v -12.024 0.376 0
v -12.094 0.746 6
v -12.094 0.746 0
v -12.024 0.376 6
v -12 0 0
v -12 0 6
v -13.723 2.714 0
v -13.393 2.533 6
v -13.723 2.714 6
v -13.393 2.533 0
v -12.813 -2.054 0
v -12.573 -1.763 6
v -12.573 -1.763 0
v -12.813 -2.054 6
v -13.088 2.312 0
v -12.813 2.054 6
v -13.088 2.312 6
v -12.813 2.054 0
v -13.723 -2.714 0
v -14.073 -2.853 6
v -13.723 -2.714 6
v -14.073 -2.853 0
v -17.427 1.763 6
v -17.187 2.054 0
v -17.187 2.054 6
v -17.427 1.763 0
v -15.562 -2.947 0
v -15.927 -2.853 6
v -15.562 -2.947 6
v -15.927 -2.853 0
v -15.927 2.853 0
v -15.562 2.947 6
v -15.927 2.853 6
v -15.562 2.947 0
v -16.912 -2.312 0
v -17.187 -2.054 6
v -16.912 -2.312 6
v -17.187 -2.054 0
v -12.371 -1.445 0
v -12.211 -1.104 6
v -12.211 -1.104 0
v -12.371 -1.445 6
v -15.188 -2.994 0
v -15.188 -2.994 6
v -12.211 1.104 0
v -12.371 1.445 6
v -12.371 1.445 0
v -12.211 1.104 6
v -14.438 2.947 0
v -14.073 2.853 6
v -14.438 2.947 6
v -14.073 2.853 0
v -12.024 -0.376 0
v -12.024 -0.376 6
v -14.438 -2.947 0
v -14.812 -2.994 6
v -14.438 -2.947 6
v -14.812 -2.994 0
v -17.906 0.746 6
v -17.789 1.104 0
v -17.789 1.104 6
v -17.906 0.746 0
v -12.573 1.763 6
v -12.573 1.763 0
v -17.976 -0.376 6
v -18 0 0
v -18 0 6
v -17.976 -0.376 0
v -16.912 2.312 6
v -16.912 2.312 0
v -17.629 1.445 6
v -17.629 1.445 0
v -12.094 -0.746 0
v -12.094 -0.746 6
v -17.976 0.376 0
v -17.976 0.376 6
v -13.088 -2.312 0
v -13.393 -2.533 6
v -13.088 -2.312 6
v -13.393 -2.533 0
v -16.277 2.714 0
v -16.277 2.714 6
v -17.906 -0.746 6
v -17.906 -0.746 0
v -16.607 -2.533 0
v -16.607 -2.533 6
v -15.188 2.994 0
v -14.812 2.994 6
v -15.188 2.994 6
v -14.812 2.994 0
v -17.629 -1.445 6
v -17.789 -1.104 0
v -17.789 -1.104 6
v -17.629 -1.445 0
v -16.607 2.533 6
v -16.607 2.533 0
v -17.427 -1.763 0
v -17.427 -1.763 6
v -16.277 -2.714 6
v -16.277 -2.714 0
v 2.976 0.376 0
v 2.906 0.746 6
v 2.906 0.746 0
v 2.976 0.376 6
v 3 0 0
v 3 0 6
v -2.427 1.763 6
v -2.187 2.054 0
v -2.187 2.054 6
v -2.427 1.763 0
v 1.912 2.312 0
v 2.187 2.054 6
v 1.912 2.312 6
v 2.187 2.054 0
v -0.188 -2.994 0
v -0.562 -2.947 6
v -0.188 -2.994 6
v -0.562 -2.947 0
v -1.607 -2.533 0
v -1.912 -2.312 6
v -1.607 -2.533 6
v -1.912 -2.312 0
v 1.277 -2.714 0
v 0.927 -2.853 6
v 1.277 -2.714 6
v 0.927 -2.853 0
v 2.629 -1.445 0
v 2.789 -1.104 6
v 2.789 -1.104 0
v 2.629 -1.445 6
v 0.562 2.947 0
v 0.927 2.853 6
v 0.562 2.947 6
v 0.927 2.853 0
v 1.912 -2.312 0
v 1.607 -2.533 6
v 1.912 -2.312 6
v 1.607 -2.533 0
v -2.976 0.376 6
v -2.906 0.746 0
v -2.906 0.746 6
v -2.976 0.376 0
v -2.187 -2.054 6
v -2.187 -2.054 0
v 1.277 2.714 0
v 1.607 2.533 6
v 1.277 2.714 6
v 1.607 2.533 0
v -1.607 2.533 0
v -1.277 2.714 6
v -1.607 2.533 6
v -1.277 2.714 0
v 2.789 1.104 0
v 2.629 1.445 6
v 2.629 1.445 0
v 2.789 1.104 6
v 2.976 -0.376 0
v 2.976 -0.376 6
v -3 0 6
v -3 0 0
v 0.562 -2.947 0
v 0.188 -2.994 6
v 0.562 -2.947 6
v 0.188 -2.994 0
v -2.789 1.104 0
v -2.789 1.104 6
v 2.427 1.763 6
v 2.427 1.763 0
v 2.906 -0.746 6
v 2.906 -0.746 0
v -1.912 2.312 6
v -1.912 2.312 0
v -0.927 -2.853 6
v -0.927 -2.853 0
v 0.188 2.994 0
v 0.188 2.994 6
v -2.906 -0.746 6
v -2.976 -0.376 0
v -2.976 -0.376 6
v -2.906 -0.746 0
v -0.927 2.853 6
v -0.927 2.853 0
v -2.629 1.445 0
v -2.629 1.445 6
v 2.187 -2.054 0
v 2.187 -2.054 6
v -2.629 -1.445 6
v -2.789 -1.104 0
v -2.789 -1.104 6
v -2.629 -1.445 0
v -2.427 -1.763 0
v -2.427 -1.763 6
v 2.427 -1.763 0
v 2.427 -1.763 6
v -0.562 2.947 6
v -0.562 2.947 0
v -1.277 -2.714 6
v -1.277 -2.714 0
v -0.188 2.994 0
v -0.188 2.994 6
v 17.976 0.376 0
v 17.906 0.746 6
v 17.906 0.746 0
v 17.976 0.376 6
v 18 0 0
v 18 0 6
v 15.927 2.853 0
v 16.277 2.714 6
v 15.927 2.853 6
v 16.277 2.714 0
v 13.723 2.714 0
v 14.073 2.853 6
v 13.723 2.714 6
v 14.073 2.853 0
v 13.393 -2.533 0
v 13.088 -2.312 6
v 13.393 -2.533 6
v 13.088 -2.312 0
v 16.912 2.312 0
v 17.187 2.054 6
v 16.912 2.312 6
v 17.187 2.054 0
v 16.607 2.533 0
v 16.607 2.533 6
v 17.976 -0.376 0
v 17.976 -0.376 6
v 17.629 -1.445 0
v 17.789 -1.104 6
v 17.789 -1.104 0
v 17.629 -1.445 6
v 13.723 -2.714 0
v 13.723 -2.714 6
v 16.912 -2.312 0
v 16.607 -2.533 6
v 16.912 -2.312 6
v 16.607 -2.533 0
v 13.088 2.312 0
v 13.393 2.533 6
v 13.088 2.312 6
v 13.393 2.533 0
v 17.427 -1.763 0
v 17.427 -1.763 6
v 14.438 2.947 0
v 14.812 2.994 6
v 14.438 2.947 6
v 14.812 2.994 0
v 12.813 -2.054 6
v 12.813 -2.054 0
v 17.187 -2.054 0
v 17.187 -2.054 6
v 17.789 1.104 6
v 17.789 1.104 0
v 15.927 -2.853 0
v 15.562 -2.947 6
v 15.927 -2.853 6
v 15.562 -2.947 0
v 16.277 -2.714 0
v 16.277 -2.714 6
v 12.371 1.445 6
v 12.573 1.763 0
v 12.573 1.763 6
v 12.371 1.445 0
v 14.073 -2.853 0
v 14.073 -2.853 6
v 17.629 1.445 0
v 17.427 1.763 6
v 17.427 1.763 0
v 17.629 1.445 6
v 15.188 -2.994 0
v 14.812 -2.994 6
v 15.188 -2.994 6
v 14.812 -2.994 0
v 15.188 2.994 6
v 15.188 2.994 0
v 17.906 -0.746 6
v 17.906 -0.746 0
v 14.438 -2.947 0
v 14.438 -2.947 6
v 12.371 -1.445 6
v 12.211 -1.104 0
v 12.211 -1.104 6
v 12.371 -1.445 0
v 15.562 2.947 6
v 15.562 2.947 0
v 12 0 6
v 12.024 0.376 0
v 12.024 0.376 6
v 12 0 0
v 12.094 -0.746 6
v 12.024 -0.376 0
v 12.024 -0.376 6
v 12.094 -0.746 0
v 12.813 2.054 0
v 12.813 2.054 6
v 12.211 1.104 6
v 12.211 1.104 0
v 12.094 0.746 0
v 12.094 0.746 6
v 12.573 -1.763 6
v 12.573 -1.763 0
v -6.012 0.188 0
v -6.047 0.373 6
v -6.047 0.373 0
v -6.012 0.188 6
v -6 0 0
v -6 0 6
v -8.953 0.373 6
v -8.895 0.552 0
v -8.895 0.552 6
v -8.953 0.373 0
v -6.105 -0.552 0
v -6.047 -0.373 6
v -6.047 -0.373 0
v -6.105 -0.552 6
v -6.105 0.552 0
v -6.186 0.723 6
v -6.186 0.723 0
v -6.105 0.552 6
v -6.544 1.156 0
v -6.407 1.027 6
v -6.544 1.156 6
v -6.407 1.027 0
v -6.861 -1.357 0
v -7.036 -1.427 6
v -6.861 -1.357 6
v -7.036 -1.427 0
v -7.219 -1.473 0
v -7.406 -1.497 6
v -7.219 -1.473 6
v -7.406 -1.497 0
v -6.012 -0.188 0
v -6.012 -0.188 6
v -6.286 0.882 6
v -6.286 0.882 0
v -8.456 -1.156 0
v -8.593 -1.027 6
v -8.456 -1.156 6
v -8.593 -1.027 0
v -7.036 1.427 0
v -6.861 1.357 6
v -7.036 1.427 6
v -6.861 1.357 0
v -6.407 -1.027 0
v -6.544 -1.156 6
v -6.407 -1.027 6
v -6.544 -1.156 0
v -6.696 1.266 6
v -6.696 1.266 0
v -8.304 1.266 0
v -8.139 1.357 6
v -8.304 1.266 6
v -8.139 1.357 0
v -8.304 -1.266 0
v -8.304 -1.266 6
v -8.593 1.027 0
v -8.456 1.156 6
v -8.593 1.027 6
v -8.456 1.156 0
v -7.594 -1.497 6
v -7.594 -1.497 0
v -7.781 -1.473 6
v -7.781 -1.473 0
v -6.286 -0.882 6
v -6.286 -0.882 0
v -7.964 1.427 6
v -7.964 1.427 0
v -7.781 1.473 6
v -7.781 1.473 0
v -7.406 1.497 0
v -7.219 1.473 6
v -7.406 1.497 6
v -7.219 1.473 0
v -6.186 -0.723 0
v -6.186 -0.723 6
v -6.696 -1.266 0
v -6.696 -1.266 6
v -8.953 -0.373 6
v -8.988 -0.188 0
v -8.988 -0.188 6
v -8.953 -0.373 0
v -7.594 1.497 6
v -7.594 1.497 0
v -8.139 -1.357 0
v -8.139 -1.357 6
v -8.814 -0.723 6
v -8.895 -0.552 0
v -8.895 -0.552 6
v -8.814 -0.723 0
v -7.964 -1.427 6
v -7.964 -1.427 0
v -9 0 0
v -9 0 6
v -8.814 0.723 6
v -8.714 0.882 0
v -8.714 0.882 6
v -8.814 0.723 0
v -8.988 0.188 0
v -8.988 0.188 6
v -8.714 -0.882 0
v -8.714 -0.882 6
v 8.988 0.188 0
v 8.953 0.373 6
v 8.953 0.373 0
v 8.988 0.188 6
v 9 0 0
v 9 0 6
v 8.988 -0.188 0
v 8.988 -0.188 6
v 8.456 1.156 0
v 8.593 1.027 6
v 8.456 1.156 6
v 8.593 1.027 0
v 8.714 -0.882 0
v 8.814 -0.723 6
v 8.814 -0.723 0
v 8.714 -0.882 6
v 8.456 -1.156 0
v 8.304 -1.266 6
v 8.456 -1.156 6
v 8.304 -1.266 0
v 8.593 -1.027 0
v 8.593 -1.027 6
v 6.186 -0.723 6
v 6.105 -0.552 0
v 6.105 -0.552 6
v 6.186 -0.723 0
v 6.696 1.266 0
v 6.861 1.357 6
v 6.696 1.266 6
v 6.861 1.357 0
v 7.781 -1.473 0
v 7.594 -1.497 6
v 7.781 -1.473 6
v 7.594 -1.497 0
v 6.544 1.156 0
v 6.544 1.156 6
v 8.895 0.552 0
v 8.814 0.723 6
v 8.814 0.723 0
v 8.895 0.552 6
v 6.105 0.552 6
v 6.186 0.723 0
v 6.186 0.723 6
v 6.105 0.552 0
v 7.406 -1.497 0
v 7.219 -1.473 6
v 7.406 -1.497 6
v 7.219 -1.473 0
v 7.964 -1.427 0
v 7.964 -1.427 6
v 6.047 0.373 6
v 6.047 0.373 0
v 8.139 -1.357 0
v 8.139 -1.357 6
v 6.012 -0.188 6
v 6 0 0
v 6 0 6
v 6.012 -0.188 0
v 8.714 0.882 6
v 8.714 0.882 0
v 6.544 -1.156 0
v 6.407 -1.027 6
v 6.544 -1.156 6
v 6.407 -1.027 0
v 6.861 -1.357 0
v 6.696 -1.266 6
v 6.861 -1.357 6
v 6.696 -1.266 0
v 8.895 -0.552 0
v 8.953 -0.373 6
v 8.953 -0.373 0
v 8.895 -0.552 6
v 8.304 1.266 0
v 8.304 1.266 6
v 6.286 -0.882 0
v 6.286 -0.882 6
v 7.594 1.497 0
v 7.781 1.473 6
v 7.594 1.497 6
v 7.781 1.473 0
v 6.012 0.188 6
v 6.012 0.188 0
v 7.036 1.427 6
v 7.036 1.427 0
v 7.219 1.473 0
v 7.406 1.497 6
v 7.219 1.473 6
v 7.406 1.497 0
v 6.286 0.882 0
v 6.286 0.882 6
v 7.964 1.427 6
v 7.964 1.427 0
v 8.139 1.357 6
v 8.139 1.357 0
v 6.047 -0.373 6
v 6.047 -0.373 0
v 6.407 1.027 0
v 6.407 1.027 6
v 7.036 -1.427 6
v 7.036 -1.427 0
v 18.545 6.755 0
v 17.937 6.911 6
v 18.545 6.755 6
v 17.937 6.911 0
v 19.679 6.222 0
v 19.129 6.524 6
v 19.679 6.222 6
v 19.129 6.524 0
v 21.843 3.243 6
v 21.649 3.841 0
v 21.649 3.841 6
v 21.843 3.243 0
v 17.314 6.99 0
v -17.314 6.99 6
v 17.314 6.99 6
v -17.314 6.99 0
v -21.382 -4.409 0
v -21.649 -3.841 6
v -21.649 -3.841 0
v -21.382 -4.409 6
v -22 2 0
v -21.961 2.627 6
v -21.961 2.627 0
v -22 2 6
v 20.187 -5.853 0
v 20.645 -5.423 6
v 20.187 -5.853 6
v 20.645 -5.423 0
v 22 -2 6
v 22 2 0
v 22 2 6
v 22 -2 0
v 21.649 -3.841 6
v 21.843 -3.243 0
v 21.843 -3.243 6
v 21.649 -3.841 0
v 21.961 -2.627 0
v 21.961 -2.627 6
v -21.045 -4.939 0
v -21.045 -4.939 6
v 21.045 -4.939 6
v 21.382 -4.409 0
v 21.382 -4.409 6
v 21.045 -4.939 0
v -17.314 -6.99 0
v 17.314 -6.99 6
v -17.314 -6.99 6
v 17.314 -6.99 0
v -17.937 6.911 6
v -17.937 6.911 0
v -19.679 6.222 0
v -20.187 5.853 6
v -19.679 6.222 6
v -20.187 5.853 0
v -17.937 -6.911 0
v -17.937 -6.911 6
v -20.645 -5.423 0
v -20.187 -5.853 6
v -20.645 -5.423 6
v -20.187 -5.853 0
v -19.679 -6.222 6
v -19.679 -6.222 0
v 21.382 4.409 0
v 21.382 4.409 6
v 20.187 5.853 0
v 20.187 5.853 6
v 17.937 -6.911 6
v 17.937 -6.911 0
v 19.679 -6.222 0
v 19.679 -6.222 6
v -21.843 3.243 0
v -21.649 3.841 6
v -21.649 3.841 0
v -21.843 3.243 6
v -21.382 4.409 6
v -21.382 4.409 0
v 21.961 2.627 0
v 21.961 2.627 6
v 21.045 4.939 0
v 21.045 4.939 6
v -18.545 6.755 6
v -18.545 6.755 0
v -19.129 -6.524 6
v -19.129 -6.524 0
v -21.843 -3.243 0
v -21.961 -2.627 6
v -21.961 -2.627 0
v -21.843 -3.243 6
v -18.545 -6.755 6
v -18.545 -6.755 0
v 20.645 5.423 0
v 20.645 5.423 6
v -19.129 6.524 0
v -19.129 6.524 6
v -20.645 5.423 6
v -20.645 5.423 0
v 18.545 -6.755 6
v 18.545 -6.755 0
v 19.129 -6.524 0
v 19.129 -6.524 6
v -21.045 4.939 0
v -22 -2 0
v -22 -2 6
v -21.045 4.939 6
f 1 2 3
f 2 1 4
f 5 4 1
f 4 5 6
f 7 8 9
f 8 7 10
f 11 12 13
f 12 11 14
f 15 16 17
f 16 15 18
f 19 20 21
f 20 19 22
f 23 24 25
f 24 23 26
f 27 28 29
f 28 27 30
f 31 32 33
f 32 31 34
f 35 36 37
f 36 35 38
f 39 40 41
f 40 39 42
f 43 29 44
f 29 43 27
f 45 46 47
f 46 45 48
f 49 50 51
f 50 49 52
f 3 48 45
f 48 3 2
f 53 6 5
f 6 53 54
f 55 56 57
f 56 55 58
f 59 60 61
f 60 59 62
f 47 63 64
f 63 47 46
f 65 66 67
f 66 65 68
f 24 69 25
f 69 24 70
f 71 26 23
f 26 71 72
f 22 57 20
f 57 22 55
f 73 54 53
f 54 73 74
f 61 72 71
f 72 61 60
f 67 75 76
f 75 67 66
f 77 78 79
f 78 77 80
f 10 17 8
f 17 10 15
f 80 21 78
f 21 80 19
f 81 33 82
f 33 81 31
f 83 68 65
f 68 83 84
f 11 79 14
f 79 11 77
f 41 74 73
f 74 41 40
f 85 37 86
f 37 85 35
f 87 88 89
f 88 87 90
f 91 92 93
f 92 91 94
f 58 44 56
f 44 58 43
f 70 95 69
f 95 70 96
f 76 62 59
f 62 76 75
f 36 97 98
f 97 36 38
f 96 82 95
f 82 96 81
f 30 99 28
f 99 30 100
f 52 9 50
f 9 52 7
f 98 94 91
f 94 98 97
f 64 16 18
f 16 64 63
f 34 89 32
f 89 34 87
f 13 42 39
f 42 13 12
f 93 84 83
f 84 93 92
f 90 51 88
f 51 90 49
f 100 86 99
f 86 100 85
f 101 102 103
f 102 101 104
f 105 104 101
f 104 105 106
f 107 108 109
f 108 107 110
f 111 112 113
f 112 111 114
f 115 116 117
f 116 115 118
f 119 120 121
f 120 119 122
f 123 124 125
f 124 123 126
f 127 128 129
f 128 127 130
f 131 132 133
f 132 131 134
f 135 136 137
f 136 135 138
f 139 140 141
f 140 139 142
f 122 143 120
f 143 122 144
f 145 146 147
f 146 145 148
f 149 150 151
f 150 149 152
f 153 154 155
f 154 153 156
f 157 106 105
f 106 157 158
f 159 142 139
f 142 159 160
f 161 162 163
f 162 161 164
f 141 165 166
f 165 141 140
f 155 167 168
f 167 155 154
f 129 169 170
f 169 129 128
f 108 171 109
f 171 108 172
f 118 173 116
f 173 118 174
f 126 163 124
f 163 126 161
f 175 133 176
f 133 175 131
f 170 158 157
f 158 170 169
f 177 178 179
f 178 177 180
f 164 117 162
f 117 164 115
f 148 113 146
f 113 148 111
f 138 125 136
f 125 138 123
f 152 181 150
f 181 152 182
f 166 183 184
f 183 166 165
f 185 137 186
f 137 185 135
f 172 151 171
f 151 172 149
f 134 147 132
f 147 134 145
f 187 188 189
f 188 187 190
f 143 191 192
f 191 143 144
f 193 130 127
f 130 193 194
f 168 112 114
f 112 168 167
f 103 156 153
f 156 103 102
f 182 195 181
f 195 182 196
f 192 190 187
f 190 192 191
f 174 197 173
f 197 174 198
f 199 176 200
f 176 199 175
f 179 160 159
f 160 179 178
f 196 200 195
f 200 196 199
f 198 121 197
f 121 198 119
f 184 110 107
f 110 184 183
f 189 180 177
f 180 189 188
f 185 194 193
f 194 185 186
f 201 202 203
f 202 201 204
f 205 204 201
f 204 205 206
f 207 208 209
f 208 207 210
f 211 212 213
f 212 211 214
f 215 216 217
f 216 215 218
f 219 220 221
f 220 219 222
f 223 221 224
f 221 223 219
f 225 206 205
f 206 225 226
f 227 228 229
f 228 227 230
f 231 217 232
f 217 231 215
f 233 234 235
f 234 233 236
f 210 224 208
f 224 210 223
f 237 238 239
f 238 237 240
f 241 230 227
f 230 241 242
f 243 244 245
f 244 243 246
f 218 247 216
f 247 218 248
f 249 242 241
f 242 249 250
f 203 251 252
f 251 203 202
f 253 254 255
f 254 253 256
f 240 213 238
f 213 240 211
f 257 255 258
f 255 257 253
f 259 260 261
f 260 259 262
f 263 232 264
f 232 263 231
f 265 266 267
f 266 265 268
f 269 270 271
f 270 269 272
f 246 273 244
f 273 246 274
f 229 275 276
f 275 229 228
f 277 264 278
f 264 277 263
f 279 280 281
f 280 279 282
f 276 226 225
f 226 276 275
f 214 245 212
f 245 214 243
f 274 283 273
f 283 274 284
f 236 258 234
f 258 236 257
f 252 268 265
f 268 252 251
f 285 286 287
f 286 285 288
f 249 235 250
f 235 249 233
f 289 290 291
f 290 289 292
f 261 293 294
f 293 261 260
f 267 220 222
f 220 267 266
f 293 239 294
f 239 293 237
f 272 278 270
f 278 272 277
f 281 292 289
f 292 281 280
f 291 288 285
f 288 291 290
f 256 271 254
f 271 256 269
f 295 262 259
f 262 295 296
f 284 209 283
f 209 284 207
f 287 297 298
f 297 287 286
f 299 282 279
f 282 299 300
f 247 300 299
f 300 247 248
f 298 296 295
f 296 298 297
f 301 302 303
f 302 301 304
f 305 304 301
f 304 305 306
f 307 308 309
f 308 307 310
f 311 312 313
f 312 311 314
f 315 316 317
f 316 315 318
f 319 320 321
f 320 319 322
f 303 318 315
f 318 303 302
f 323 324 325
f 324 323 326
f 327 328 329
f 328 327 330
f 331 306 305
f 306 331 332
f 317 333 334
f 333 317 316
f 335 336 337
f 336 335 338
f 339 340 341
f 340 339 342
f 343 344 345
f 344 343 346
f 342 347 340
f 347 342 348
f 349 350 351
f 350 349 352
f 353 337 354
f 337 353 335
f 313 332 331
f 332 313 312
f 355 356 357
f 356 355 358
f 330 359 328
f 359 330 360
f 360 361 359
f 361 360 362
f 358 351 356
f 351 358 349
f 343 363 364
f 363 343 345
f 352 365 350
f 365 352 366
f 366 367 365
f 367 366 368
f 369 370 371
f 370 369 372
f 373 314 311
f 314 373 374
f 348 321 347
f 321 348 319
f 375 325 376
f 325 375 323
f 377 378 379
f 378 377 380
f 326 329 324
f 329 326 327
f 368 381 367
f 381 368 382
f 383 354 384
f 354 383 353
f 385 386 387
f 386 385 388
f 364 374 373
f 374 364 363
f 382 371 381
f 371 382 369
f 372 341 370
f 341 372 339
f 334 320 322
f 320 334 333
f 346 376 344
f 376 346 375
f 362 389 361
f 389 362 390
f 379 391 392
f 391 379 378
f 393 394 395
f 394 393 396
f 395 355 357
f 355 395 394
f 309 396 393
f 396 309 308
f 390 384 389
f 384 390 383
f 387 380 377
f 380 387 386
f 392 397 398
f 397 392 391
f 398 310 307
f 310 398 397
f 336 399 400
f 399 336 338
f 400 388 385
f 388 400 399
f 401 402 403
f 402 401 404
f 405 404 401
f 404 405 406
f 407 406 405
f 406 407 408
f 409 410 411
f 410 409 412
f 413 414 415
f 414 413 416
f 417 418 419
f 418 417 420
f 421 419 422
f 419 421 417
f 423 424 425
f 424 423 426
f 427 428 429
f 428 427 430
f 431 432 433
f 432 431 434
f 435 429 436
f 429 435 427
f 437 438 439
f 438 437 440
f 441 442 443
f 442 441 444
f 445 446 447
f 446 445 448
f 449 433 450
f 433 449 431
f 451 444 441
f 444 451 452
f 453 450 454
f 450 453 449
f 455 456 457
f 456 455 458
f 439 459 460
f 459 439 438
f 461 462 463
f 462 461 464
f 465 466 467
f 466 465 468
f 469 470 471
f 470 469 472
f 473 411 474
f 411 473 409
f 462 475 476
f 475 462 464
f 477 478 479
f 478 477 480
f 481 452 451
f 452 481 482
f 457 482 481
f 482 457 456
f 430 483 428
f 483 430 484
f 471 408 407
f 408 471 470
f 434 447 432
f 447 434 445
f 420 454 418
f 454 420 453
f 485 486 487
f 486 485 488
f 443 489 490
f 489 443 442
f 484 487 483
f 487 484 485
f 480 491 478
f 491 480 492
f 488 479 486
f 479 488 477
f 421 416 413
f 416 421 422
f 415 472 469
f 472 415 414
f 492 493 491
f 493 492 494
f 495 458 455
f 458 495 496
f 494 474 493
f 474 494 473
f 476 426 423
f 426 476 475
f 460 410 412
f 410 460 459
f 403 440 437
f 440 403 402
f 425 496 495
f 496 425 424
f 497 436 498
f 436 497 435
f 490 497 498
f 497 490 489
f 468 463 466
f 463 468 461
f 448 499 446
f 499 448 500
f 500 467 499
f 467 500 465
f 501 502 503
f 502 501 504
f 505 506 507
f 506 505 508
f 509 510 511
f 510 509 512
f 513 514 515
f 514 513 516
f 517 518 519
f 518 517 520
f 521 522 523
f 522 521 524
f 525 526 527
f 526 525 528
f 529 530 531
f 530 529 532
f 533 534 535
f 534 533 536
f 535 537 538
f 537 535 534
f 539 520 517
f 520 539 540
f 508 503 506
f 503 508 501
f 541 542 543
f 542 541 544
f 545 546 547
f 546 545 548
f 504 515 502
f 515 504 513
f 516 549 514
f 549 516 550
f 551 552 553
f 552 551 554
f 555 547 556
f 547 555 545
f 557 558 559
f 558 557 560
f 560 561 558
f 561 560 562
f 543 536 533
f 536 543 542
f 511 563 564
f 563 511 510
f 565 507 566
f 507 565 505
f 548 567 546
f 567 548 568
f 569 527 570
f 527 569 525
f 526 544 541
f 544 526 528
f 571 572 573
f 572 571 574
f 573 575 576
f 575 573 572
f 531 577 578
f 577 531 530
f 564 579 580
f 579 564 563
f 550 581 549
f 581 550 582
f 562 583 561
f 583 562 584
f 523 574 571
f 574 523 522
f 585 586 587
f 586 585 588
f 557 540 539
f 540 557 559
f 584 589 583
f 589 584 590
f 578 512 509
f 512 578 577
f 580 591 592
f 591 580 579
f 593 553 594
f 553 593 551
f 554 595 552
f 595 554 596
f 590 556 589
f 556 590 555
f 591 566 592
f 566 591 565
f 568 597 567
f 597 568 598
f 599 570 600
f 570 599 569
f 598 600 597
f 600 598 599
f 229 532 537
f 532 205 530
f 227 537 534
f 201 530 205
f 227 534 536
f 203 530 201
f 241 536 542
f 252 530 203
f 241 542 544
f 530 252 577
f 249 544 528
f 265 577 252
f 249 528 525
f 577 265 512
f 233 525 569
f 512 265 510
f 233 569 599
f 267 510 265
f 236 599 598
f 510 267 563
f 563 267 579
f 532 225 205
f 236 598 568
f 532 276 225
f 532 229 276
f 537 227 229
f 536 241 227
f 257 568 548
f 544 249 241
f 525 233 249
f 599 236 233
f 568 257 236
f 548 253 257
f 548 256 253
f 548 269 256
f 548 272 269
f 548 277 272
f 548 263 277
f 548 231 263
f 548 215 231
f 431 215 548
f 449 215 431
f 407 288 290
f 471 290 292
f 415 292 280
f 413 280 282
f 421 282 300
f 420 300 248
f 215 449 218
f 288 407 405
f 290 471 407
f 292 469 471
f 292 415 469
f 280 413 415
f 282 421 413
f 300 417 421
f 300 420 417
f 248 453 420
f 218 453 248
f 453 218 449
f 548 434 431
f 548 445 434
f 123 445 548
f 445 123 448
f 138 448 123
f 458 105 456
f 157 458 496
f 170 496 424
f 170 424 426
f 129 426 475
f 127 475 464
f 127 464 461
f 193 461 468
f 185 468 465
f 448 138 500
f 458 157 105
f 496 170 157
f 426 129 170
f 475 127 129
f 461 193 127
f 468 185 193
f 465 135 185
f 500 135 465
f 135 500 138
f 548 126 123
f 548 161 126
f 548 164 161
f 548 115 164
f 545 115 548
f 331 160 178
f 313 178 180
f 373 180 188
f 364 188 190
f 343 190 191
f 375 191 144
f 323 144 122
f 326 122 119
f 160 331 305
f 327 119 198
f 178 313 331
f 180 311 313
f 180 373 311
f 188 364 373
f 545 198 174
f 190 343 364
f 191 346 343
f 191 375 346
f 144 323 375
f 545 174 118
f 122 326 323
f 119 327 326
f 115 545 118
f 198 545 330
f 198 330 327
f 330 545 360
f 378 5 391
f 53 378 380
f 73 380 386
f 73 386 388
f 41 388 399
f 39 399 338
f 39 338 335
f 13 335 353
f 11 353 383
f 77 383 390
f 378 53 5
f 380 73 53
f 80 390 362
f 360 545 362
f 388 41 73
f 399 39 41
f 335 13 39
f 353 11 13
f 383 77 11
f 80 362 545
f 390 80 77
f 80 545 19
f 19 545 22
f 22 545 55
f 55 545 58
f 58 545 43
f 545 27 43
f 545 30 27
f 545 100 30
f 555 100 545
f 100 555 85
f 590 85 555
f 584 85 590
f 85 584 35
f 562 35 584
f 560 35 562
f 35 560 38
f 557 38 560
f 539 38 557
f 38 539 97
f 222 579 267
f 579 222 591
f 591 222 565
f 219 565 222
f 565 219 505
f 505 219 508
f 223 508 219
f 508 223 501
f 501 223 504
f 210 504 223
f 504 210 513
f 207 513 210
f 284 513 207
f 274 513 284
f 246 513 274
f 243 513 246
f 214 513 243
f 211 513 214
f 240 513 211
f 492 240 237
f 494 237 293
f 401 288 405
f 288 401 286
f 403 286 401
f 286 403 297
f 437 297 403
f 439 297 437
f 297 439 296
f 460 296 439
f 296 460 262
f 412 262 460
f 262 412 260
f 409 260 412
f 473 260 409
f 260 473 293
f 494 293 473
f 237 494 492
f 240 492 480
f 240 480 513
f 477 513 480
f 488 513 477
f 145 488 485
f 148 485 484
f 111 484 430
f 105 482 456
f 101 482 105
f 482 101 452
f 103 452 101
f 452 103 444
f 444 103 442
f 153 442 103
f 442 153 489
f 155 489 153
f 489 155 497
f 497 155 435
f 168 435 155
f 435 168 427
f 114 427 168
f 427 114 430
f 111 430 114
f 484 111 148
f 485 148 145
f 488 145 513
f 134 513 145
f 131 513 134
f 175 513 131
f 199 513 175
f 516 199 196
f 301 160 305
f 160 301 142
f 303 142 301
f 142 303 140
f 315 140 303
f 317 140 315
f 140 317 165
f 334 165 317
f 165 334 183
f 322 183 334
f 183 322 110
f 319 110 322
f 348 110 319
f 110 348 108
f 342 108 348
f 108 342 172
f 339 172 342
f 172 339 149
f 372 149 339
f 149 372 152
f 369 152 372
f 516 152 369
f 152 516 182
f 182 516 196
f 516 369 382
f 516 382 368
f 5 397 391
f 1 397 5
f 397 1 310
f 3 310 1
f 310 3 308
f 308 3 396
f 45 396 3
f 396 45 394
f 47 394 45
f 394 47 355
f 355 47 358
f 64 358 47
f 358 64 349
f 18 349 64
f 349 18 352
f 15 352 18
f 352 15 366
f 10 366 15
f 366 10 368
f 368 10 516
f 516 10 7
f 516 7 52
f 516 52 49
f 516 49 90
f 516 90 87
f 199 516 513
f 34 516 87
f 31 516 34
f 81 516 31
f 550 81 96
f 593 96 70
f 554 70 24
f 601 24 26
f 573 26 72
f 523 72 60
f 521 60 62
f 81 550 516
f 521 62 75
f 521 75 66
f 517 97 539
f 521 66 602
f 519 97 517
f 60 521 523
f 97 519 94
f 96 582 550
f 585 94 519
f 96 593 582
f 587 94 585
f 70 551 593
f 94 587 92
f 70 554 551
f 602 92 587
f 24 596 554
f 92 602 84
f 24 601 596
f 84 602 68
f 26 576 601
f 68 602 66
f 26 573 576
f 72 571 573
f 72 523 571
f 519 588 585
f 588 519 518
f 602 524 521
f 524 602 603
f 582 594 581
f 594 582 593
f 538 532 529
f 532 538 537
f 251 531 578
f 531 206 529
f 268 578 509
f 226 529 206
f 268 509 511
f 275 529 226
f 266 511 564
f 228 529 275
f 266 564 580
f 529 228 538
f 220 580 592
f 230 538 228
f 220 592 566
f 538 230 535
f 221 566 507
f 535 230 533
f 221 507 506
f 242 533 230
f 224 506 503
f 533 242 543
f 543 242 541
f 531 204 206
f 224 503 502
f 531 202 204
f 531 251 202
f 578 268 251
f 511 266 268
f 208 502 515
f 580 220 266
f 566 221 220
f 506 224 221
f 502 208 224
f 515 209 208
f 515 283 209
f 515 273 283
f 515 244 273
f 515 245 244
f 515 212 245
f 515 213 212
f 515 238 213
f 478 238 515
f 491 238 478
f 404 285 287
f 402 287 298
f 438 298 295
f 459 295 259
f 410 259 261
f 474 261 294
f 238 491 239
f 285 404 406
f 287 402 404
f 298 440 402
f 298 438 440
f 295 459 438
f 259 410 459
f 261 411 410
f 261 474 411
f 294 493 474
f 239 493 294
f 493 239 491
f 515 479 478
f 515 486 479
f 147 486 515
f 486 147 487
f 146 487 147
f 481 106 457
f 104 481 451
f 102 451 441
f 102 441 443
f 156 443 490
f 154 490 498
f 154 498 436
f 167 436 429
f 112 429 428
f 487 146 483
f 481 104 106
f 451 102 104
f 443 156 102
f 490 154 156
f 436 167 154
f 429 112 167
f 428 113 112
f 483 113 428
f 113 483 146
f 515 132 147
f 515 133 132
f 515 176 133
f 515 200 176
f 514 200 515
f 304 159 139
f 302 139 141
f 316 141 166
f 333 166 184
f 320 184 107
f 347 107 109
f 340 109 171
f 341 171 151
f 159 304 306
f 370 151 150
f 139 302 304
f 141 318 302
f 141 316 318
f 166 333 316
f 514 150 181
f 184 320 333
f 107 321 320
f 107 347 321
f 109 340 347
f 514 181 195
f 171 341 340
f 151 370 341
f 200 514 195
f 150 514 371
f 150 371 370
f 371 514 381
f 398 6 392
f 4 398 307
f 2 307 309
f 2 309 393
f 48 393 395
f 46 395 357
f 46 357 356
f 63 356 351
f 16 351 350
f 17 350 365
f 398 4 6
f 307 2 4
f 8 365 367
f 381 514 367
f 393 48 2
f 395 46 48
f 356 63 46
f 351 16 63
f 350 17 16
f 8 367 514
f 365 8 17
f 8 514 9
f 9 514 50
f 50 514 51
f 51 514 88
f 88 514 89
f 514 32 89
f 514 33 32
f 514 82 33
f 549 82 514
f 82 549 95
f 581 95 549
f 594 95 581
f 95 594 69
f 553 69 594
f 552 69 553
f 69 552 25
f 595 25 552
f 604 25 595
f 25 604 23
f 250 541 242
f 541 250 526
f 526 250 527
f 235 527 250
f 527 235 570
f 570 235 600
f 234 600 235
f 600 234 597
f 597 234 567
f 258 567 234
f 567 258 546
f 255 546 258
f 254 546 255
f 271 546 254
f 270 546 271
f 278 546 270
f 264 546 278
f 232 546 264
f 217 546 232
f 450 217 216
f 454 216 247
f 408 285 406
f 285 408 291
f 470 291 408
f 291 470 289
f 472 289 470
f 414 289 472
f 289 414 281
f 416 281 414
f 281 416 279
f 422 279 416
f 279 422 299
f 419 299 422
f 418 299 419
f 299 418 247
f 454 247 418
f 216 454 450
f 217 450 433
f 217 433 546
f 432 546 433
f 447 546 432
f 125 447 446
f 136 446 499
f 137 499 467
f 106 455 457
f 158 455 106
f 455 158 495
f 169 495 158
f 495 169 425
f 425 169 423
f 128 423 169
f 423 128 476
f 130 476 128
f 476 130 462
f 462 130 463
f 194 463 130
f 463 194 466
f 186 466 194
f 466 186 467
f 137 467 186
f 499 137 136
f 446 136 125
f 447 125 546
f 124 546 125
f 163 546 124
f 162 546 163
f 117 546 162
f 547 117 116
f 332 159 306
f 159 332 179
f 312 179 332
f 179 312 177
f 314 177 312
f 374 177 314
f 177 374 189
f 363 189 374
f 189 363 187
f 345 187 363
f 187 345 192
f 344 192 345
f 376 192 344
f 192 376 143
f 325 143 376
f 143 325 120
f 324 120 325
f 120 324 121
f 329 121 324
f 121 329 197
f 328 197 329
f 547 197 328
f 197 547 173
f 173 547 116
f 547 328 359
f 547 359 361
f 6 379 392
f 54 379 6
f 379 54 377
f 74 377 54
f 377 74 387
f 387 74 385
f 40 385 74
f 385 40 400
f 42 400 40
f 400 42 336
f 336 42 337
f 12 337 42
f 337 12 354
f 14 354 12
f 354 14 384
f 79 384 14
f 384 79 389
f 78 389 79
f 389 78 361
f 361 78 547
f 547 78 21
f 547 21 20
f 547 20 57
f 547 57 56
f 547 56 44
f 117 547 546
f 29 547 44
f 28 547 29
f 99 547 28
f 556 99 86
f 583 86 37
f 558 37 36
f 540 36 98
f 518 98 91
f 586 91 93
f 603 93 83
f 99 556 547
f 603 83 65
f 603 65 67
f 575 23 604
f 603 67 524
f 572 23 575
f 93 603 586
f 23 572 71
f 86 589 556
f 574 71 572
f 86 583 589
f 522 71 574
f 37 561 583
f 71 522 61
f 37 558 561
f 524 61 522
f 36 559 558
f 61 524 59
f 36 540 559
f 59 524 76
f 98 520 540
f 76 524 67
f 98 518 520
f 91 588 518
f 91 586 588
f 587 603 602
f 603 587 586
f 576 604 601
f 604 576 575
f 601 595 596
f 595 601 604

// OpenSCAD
$fn = 50;


difference() {
	union() {
		hull() {
			translate(v = [-17.0000000000, 2.0000000000, 0]) {
				cylinder(h = 6, r = 5);
			}
			translate(v = [17.0000000000, 2.0000000000, 0]) {
				cylinder(h = 6, r = 5);
			}
			translate(v = [-17.0000000000, -2.0000000000, 0]) {
				cylinder(h = 6, r = 5);
			}
			translate(v = [17.0000000000, -2.0000000000, 0]) {
				cylinder(h = 6, r = 5);
			}
		}
	}
	union() {
		translate(v = [-15.0000000000, 0.0000000000, 0]) {
			translate(v = [0, 0, -100]) {
				cylinder(h = 200, r = 3.0000000000);
			}
		}
		translate(v = [0, 0, -100]) {
			cylinder(h = 200, r = 3.0000000000);
		}
		translate(v = [15.0000000000, 0.0000000000, 0]) {
			translate(v = [0, 0, -100]) {
				cylinder(h = 200, r = 3.0000000000);
			}
		}
		translate(v = [-15.0000000000, 0.0000000000, 0]) {
			translate(v = [0, 0, -100]) {
				cylinder(h = 200, r = 1.5000000000);
			}
		}
		translate(v = [-7.5000000000, 0.0000000000, 0]) {
			translate(v = [0, 0, -100]) {
				cylinder(h = 200, r = 1.5000000000);
			}
		}
		translate(v = [0, 0, -100]) {
			cylinder(h = 200, r = 1.5000000000);
		}
		translate(v = [7.5000000000, 0.0000000000, 0]) {
			translate(v = [0, 0, -100]) {
				cylinder(h = 200, r = 1.5000000000);
			}
		}
		translate(v = [15.0000000000, 0.0000000000, 0]) {
			translate(v = [0, 0, -100]) {
				cylinder(h = 200, r = 1.5000000000);
			}
		}
	}
}
